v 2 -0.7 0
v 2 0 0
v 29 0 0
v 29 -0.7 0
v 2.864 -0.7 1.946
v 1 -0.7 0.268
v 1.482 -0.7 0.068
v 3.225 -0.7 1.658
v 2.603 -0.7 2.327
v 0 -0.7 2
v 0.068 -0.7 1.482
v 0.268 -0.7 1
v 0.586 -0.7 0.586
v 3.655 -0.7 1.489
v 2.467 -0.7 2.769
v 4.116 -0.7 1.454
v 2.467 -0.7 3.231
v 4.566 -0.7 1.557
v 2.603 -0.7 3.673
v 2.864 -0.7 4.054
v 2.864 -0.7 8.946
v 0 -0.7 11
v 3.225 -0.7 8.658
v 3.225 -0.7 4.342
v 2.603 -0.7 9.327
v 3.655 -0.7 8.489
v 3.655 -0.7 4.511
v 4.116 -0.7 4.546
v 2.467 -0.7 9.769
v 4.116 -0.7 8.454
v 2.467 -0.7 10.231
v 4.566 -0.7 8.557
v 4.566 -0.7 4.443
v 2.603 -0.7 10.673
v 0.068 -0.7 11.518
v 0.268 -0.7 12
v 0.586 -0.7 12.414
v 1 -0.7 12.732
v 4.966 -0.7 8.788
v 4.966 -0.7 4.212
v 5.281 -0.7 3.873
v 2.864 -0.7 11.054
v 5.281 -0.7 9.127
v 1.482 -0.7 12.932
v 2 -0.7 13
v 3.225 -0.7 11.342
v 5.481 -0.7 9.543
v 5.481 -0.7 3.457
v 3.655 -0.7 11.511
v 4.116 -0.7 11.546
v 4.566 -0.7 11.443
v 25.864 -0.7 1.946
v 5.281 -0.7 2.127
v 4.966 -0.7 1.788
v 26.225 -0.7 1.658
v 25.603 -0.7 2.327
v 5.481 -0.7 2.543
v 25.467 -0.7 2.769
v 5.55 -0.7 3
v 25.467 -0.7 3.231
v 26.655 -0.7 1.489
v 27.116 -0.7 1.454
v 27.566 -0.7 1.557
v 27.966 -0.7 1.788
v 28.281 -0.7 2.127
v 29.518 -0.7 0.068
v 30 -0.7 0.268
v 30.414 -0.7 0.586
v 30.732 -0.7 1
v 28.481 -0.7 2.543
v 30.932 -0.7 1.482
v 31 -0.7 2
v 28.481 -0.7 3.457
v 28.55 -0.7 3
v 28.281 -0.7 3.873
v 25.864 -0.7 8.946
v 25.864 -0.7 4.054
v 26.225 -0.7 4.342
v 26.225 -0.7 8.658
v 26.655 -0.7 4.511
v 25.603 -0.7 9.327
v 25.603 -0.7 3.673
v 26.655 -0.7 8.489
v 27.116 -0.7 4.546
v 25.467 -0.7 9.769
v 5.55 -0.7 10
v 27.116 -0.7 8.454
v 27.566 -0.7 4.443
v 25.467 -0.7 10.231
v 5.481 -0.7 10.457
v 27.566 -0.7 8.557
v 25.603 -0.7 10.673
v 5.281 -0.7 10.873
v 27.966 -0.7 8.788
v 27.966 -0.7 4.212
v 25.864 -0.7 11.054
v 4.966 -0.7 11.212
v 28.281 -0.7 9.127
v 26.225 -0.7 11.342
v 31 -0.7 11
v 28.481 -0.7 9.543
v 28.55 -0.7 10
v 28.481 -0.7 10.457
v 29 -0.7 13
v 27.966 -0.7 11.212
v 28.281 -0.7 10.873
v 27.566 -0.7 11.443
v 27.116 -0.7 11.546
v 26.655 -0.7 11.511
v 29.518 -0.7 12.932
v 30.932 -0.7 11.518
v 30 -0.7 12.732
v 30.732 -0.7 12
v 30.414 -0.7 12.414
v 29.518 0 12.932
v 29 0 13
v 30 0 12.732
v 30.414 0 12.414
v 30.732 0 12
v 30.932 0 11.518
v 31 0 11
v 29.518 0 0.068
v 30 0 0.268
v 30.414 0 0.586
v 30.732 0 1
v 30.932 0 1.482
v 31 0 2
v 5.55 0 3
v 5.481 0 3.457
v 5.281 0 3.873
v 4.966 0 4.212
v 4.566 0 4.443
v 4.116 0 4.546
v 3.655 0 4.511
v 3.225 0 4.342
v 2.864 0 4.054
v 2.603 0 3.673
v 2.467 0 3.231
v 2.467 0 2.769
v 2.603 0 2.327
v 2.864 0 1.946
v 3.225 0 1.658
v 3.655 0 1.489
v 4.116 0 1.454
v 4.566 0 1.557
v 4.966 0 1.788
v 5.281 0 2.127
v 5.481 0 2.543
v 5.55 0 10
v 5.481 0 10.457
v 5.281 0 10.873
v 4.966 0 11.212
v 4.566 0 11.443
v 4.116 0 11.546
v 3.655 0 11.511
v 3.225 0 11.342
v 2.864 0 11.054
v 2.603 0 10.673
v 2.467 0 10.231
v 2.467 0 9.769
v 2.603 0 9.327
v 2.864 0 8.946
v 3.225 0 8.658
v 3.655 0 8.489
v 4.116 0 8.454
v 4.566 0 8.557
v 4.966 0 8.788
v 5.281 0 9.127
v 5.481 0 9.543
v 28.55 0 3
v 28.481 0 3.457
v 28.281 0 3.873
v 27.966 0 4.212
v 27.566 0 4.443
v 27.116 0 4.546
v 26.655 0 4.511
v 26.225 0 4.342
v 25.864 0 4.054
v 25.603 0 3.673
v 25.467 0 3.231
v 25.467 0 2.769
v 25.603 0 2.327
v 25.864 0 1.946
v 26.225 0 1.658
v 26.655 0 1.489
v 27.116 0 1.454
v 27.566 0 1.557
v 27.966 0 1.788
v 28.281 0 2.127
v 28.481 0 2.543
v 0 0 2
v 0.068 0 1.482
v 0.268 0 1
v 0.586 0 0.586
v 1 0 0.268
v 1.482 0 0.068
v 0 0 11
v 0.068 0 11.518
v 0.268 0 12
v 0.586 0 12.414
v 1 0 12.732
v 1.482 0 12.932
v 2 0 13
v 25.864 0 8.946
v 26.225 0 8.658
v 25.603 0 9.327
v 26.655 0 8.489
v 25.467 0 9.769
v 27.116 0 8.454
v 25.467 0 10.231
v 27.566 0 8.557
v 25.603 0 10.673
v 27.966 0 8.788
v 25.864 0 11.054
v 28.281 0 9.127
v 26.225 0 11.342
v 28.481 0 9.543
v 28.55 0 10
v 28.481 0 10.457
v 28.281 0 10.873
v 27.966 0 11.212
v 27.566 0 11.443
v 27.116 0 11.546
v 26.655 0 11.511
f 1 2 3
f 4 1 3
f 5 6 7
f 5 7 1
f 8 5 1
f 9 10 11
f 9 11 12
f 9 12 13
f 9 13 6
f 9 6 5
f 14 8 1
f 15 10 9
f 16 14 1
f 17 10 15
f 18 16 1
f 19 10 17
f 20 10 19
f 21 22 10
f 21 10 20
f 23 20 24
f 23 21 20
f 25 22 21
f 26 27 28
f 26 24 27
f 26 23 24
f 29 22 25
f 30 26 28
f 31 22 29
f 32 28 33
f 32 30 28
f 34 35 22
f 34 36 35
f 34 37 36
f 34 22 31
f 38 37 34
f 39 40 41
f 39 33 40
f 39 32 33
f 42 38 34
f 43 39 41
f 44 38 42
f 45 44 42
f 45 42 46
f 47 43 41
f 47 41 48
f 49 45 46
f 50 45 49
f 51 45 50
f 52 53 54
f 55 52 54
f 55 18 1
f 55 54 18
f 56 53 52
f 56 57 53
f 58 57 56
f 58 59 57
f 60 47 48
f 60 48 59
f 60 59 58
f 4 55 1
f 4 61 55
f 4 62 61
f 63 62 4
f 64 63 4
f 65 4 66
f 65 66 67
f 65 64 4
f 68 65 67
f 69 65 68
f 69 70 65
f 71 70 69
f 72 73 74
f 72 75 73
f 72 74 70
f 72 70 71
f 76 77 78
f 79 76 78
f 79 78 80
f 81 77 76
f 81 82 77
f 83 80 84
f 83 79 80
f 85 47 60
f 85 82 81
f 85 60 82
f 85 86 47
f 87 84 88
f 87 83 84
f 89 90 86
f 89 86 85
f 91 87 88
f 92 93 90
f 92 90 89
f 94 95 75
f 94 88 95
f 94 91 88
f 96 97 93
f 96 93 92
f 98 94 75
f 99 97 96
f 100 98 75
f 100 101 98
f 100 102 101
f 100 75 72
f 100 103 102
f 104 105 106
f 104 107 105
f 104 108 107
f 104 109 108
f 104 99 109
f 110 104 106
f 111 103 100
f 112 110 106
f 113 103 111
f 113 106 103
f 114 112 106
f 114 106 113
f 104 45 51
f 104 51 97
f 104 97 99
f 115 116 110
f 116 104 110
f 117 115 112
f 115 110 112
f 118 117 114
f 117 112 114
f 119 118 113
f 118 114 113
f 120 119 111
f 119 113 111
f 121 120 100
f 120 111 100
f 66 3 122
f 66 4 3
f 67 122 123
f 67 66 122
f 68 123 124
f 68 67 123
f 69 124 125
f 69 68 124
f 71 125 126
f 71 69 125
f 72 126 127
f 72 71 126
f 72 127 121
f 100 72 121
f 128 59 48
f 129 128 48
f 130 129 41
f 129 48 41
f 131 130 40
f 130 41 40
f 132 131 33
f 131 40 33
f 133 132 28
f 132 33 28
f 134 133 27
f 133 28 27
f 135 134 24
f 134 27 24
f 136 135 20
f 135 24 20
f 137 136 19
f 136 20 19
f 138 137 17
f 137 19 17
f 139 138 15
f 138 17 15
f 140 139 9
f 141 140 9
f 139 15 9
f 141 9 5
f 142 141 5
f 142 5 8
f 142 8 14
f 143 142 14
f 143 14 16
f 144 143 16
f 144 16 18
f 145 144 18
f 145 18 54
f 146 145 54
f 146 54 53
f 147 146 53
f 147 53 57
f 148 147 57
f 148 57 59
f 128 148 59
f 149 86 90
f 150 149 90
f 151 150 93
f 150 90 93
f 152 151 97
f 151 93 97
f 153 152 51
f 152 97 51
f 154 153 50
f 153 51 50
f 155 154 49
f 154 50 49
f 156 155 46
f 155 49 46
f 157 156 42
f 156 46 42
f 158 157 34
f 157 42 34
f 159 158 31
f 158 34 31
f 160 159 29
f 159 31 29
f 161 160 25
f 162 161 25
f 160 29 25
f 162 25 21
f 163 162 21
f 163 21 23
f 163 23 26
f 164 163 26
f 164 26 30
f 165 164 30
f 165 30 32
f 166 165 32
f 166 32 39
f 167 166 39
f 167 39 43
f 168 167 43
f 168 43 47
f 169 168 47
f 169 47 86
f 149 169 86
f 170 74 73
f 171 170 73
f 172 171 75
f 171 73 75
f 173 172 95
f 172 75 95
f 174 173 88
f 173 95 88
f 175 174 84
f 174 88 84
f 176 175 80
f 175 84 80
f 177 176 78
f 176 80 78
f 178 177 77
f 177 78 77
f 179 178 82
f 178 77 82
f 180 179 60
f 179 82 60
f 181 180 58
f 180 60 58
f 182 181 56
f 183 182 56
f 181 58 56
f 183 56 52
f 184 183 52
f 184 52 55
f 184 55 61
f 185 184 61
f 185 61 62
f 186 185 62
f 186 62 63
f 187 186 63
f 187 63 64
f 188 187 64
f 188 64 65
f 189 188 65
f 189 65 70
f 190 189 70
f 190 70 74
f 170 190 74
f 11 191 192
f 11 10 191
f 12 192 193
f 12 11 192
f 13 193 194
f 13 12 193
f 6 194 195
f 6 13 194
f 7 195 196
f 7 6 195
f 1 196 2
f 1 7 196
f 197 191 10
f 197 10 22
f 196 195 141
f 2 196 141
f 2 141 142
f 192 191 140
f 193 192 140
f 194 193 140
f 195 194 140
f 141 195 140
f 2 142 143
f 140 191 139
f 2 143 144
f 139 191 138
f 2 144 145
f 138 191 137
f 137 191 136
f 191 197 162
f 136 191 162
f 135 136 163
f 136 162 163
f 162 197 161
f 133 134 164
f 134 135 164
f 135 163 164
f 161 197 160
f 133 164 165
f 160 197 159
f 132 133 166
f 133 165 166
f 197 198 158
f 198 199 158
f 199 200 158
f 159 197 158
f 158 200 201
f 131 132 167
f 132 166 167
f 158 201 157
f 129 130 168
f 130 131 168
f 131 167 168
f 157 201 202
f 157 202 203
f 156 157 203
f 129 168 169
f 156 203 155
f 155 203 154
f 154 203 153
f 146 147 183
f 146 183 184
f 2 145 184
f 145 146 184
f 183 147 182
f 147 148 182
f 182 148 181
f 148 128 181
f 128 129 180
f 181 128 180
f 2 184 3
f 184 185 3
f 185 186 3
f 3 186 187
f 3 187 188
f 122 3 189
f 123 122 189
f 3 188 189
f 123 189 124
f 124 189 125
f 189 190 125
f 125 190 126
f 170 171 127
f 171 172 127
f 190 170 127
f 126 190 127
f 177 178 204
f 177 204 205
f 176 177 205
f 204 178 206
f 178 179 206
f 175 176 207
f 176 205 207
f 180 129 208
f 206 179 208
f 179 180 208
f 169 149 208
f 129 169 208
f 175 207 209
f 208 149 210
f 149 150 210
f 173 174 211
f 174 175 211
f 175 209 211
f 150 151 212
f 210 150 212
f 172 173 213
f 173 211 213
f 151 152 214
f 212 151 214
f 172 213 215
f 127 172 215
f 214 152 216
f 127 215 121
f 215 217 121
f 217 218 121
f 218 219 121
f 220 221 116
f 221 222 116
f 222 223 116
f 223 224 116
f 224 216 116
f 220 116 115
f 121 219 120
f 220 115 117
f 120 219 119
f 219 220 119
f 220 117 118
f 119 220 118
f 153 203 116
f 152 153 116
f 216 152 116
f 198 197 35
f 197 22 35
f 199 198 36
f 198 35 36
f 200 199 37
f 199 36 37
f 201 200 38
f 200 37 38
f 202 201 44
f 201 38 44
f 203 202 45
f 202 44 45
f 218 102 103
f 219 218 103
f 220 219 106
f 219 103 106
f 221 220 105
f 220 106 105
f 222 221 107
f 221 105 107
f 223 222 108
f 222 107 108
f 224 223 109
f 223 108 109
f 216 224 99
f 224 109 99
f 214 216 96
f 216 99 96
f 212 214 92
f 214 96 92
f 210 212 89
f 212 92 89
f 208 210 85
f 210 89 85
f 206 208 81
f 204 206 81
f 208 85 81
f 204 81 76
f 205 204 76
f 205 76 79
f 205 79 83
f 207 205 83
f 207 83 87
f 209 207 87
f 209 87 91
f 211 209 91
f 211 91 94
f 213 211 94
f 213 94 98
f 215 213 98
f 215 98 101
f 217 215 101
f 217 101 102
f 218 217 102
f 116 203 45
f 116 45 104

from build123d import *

# Parameters (mm, degrees)
F0_W     = 31
F0_H     = 13
F1_DEPTH = 0.7
F2_R     = 1.55
F3_DEPTH = 25
F4_R     = 2


with BuildPart() as f1:
    # F0 (on Front) → F1 (new body)
    with BuildSketch(Plane.XZ):
        with Locations((15.5, 6.5)):
            Rectangle(F0_W, F0_H)
    extrude(amount=F1_DEPTH)

    # F2 (on face) → F3 (cut)
    with BuildSketch(Plane.XZ.offset(0.7)):
        with Locations((4, 10)):
            Circle(F2_R)
        with Locations((4, 3)):
            Circle(F2_R)
        with Locations((27, 10)):
            Circle(F2_R)
        with Locations((27, 3)):
            Circle(F2_R)
    extrude(amount=-F3_DEPTH, mode=Mode.SUBTRACT)

    # F4
    f4_edges = [f1.edges().sort_by_distance(p)[0] for p in [
        (31, -0.35, 13),
        (31, -0.35, 0),
        (0, -0.35, 0),
        (0, -0.35, 13),
    ]]
    fillet(f4_edges, radius=F4_R)


solid = f1.part
